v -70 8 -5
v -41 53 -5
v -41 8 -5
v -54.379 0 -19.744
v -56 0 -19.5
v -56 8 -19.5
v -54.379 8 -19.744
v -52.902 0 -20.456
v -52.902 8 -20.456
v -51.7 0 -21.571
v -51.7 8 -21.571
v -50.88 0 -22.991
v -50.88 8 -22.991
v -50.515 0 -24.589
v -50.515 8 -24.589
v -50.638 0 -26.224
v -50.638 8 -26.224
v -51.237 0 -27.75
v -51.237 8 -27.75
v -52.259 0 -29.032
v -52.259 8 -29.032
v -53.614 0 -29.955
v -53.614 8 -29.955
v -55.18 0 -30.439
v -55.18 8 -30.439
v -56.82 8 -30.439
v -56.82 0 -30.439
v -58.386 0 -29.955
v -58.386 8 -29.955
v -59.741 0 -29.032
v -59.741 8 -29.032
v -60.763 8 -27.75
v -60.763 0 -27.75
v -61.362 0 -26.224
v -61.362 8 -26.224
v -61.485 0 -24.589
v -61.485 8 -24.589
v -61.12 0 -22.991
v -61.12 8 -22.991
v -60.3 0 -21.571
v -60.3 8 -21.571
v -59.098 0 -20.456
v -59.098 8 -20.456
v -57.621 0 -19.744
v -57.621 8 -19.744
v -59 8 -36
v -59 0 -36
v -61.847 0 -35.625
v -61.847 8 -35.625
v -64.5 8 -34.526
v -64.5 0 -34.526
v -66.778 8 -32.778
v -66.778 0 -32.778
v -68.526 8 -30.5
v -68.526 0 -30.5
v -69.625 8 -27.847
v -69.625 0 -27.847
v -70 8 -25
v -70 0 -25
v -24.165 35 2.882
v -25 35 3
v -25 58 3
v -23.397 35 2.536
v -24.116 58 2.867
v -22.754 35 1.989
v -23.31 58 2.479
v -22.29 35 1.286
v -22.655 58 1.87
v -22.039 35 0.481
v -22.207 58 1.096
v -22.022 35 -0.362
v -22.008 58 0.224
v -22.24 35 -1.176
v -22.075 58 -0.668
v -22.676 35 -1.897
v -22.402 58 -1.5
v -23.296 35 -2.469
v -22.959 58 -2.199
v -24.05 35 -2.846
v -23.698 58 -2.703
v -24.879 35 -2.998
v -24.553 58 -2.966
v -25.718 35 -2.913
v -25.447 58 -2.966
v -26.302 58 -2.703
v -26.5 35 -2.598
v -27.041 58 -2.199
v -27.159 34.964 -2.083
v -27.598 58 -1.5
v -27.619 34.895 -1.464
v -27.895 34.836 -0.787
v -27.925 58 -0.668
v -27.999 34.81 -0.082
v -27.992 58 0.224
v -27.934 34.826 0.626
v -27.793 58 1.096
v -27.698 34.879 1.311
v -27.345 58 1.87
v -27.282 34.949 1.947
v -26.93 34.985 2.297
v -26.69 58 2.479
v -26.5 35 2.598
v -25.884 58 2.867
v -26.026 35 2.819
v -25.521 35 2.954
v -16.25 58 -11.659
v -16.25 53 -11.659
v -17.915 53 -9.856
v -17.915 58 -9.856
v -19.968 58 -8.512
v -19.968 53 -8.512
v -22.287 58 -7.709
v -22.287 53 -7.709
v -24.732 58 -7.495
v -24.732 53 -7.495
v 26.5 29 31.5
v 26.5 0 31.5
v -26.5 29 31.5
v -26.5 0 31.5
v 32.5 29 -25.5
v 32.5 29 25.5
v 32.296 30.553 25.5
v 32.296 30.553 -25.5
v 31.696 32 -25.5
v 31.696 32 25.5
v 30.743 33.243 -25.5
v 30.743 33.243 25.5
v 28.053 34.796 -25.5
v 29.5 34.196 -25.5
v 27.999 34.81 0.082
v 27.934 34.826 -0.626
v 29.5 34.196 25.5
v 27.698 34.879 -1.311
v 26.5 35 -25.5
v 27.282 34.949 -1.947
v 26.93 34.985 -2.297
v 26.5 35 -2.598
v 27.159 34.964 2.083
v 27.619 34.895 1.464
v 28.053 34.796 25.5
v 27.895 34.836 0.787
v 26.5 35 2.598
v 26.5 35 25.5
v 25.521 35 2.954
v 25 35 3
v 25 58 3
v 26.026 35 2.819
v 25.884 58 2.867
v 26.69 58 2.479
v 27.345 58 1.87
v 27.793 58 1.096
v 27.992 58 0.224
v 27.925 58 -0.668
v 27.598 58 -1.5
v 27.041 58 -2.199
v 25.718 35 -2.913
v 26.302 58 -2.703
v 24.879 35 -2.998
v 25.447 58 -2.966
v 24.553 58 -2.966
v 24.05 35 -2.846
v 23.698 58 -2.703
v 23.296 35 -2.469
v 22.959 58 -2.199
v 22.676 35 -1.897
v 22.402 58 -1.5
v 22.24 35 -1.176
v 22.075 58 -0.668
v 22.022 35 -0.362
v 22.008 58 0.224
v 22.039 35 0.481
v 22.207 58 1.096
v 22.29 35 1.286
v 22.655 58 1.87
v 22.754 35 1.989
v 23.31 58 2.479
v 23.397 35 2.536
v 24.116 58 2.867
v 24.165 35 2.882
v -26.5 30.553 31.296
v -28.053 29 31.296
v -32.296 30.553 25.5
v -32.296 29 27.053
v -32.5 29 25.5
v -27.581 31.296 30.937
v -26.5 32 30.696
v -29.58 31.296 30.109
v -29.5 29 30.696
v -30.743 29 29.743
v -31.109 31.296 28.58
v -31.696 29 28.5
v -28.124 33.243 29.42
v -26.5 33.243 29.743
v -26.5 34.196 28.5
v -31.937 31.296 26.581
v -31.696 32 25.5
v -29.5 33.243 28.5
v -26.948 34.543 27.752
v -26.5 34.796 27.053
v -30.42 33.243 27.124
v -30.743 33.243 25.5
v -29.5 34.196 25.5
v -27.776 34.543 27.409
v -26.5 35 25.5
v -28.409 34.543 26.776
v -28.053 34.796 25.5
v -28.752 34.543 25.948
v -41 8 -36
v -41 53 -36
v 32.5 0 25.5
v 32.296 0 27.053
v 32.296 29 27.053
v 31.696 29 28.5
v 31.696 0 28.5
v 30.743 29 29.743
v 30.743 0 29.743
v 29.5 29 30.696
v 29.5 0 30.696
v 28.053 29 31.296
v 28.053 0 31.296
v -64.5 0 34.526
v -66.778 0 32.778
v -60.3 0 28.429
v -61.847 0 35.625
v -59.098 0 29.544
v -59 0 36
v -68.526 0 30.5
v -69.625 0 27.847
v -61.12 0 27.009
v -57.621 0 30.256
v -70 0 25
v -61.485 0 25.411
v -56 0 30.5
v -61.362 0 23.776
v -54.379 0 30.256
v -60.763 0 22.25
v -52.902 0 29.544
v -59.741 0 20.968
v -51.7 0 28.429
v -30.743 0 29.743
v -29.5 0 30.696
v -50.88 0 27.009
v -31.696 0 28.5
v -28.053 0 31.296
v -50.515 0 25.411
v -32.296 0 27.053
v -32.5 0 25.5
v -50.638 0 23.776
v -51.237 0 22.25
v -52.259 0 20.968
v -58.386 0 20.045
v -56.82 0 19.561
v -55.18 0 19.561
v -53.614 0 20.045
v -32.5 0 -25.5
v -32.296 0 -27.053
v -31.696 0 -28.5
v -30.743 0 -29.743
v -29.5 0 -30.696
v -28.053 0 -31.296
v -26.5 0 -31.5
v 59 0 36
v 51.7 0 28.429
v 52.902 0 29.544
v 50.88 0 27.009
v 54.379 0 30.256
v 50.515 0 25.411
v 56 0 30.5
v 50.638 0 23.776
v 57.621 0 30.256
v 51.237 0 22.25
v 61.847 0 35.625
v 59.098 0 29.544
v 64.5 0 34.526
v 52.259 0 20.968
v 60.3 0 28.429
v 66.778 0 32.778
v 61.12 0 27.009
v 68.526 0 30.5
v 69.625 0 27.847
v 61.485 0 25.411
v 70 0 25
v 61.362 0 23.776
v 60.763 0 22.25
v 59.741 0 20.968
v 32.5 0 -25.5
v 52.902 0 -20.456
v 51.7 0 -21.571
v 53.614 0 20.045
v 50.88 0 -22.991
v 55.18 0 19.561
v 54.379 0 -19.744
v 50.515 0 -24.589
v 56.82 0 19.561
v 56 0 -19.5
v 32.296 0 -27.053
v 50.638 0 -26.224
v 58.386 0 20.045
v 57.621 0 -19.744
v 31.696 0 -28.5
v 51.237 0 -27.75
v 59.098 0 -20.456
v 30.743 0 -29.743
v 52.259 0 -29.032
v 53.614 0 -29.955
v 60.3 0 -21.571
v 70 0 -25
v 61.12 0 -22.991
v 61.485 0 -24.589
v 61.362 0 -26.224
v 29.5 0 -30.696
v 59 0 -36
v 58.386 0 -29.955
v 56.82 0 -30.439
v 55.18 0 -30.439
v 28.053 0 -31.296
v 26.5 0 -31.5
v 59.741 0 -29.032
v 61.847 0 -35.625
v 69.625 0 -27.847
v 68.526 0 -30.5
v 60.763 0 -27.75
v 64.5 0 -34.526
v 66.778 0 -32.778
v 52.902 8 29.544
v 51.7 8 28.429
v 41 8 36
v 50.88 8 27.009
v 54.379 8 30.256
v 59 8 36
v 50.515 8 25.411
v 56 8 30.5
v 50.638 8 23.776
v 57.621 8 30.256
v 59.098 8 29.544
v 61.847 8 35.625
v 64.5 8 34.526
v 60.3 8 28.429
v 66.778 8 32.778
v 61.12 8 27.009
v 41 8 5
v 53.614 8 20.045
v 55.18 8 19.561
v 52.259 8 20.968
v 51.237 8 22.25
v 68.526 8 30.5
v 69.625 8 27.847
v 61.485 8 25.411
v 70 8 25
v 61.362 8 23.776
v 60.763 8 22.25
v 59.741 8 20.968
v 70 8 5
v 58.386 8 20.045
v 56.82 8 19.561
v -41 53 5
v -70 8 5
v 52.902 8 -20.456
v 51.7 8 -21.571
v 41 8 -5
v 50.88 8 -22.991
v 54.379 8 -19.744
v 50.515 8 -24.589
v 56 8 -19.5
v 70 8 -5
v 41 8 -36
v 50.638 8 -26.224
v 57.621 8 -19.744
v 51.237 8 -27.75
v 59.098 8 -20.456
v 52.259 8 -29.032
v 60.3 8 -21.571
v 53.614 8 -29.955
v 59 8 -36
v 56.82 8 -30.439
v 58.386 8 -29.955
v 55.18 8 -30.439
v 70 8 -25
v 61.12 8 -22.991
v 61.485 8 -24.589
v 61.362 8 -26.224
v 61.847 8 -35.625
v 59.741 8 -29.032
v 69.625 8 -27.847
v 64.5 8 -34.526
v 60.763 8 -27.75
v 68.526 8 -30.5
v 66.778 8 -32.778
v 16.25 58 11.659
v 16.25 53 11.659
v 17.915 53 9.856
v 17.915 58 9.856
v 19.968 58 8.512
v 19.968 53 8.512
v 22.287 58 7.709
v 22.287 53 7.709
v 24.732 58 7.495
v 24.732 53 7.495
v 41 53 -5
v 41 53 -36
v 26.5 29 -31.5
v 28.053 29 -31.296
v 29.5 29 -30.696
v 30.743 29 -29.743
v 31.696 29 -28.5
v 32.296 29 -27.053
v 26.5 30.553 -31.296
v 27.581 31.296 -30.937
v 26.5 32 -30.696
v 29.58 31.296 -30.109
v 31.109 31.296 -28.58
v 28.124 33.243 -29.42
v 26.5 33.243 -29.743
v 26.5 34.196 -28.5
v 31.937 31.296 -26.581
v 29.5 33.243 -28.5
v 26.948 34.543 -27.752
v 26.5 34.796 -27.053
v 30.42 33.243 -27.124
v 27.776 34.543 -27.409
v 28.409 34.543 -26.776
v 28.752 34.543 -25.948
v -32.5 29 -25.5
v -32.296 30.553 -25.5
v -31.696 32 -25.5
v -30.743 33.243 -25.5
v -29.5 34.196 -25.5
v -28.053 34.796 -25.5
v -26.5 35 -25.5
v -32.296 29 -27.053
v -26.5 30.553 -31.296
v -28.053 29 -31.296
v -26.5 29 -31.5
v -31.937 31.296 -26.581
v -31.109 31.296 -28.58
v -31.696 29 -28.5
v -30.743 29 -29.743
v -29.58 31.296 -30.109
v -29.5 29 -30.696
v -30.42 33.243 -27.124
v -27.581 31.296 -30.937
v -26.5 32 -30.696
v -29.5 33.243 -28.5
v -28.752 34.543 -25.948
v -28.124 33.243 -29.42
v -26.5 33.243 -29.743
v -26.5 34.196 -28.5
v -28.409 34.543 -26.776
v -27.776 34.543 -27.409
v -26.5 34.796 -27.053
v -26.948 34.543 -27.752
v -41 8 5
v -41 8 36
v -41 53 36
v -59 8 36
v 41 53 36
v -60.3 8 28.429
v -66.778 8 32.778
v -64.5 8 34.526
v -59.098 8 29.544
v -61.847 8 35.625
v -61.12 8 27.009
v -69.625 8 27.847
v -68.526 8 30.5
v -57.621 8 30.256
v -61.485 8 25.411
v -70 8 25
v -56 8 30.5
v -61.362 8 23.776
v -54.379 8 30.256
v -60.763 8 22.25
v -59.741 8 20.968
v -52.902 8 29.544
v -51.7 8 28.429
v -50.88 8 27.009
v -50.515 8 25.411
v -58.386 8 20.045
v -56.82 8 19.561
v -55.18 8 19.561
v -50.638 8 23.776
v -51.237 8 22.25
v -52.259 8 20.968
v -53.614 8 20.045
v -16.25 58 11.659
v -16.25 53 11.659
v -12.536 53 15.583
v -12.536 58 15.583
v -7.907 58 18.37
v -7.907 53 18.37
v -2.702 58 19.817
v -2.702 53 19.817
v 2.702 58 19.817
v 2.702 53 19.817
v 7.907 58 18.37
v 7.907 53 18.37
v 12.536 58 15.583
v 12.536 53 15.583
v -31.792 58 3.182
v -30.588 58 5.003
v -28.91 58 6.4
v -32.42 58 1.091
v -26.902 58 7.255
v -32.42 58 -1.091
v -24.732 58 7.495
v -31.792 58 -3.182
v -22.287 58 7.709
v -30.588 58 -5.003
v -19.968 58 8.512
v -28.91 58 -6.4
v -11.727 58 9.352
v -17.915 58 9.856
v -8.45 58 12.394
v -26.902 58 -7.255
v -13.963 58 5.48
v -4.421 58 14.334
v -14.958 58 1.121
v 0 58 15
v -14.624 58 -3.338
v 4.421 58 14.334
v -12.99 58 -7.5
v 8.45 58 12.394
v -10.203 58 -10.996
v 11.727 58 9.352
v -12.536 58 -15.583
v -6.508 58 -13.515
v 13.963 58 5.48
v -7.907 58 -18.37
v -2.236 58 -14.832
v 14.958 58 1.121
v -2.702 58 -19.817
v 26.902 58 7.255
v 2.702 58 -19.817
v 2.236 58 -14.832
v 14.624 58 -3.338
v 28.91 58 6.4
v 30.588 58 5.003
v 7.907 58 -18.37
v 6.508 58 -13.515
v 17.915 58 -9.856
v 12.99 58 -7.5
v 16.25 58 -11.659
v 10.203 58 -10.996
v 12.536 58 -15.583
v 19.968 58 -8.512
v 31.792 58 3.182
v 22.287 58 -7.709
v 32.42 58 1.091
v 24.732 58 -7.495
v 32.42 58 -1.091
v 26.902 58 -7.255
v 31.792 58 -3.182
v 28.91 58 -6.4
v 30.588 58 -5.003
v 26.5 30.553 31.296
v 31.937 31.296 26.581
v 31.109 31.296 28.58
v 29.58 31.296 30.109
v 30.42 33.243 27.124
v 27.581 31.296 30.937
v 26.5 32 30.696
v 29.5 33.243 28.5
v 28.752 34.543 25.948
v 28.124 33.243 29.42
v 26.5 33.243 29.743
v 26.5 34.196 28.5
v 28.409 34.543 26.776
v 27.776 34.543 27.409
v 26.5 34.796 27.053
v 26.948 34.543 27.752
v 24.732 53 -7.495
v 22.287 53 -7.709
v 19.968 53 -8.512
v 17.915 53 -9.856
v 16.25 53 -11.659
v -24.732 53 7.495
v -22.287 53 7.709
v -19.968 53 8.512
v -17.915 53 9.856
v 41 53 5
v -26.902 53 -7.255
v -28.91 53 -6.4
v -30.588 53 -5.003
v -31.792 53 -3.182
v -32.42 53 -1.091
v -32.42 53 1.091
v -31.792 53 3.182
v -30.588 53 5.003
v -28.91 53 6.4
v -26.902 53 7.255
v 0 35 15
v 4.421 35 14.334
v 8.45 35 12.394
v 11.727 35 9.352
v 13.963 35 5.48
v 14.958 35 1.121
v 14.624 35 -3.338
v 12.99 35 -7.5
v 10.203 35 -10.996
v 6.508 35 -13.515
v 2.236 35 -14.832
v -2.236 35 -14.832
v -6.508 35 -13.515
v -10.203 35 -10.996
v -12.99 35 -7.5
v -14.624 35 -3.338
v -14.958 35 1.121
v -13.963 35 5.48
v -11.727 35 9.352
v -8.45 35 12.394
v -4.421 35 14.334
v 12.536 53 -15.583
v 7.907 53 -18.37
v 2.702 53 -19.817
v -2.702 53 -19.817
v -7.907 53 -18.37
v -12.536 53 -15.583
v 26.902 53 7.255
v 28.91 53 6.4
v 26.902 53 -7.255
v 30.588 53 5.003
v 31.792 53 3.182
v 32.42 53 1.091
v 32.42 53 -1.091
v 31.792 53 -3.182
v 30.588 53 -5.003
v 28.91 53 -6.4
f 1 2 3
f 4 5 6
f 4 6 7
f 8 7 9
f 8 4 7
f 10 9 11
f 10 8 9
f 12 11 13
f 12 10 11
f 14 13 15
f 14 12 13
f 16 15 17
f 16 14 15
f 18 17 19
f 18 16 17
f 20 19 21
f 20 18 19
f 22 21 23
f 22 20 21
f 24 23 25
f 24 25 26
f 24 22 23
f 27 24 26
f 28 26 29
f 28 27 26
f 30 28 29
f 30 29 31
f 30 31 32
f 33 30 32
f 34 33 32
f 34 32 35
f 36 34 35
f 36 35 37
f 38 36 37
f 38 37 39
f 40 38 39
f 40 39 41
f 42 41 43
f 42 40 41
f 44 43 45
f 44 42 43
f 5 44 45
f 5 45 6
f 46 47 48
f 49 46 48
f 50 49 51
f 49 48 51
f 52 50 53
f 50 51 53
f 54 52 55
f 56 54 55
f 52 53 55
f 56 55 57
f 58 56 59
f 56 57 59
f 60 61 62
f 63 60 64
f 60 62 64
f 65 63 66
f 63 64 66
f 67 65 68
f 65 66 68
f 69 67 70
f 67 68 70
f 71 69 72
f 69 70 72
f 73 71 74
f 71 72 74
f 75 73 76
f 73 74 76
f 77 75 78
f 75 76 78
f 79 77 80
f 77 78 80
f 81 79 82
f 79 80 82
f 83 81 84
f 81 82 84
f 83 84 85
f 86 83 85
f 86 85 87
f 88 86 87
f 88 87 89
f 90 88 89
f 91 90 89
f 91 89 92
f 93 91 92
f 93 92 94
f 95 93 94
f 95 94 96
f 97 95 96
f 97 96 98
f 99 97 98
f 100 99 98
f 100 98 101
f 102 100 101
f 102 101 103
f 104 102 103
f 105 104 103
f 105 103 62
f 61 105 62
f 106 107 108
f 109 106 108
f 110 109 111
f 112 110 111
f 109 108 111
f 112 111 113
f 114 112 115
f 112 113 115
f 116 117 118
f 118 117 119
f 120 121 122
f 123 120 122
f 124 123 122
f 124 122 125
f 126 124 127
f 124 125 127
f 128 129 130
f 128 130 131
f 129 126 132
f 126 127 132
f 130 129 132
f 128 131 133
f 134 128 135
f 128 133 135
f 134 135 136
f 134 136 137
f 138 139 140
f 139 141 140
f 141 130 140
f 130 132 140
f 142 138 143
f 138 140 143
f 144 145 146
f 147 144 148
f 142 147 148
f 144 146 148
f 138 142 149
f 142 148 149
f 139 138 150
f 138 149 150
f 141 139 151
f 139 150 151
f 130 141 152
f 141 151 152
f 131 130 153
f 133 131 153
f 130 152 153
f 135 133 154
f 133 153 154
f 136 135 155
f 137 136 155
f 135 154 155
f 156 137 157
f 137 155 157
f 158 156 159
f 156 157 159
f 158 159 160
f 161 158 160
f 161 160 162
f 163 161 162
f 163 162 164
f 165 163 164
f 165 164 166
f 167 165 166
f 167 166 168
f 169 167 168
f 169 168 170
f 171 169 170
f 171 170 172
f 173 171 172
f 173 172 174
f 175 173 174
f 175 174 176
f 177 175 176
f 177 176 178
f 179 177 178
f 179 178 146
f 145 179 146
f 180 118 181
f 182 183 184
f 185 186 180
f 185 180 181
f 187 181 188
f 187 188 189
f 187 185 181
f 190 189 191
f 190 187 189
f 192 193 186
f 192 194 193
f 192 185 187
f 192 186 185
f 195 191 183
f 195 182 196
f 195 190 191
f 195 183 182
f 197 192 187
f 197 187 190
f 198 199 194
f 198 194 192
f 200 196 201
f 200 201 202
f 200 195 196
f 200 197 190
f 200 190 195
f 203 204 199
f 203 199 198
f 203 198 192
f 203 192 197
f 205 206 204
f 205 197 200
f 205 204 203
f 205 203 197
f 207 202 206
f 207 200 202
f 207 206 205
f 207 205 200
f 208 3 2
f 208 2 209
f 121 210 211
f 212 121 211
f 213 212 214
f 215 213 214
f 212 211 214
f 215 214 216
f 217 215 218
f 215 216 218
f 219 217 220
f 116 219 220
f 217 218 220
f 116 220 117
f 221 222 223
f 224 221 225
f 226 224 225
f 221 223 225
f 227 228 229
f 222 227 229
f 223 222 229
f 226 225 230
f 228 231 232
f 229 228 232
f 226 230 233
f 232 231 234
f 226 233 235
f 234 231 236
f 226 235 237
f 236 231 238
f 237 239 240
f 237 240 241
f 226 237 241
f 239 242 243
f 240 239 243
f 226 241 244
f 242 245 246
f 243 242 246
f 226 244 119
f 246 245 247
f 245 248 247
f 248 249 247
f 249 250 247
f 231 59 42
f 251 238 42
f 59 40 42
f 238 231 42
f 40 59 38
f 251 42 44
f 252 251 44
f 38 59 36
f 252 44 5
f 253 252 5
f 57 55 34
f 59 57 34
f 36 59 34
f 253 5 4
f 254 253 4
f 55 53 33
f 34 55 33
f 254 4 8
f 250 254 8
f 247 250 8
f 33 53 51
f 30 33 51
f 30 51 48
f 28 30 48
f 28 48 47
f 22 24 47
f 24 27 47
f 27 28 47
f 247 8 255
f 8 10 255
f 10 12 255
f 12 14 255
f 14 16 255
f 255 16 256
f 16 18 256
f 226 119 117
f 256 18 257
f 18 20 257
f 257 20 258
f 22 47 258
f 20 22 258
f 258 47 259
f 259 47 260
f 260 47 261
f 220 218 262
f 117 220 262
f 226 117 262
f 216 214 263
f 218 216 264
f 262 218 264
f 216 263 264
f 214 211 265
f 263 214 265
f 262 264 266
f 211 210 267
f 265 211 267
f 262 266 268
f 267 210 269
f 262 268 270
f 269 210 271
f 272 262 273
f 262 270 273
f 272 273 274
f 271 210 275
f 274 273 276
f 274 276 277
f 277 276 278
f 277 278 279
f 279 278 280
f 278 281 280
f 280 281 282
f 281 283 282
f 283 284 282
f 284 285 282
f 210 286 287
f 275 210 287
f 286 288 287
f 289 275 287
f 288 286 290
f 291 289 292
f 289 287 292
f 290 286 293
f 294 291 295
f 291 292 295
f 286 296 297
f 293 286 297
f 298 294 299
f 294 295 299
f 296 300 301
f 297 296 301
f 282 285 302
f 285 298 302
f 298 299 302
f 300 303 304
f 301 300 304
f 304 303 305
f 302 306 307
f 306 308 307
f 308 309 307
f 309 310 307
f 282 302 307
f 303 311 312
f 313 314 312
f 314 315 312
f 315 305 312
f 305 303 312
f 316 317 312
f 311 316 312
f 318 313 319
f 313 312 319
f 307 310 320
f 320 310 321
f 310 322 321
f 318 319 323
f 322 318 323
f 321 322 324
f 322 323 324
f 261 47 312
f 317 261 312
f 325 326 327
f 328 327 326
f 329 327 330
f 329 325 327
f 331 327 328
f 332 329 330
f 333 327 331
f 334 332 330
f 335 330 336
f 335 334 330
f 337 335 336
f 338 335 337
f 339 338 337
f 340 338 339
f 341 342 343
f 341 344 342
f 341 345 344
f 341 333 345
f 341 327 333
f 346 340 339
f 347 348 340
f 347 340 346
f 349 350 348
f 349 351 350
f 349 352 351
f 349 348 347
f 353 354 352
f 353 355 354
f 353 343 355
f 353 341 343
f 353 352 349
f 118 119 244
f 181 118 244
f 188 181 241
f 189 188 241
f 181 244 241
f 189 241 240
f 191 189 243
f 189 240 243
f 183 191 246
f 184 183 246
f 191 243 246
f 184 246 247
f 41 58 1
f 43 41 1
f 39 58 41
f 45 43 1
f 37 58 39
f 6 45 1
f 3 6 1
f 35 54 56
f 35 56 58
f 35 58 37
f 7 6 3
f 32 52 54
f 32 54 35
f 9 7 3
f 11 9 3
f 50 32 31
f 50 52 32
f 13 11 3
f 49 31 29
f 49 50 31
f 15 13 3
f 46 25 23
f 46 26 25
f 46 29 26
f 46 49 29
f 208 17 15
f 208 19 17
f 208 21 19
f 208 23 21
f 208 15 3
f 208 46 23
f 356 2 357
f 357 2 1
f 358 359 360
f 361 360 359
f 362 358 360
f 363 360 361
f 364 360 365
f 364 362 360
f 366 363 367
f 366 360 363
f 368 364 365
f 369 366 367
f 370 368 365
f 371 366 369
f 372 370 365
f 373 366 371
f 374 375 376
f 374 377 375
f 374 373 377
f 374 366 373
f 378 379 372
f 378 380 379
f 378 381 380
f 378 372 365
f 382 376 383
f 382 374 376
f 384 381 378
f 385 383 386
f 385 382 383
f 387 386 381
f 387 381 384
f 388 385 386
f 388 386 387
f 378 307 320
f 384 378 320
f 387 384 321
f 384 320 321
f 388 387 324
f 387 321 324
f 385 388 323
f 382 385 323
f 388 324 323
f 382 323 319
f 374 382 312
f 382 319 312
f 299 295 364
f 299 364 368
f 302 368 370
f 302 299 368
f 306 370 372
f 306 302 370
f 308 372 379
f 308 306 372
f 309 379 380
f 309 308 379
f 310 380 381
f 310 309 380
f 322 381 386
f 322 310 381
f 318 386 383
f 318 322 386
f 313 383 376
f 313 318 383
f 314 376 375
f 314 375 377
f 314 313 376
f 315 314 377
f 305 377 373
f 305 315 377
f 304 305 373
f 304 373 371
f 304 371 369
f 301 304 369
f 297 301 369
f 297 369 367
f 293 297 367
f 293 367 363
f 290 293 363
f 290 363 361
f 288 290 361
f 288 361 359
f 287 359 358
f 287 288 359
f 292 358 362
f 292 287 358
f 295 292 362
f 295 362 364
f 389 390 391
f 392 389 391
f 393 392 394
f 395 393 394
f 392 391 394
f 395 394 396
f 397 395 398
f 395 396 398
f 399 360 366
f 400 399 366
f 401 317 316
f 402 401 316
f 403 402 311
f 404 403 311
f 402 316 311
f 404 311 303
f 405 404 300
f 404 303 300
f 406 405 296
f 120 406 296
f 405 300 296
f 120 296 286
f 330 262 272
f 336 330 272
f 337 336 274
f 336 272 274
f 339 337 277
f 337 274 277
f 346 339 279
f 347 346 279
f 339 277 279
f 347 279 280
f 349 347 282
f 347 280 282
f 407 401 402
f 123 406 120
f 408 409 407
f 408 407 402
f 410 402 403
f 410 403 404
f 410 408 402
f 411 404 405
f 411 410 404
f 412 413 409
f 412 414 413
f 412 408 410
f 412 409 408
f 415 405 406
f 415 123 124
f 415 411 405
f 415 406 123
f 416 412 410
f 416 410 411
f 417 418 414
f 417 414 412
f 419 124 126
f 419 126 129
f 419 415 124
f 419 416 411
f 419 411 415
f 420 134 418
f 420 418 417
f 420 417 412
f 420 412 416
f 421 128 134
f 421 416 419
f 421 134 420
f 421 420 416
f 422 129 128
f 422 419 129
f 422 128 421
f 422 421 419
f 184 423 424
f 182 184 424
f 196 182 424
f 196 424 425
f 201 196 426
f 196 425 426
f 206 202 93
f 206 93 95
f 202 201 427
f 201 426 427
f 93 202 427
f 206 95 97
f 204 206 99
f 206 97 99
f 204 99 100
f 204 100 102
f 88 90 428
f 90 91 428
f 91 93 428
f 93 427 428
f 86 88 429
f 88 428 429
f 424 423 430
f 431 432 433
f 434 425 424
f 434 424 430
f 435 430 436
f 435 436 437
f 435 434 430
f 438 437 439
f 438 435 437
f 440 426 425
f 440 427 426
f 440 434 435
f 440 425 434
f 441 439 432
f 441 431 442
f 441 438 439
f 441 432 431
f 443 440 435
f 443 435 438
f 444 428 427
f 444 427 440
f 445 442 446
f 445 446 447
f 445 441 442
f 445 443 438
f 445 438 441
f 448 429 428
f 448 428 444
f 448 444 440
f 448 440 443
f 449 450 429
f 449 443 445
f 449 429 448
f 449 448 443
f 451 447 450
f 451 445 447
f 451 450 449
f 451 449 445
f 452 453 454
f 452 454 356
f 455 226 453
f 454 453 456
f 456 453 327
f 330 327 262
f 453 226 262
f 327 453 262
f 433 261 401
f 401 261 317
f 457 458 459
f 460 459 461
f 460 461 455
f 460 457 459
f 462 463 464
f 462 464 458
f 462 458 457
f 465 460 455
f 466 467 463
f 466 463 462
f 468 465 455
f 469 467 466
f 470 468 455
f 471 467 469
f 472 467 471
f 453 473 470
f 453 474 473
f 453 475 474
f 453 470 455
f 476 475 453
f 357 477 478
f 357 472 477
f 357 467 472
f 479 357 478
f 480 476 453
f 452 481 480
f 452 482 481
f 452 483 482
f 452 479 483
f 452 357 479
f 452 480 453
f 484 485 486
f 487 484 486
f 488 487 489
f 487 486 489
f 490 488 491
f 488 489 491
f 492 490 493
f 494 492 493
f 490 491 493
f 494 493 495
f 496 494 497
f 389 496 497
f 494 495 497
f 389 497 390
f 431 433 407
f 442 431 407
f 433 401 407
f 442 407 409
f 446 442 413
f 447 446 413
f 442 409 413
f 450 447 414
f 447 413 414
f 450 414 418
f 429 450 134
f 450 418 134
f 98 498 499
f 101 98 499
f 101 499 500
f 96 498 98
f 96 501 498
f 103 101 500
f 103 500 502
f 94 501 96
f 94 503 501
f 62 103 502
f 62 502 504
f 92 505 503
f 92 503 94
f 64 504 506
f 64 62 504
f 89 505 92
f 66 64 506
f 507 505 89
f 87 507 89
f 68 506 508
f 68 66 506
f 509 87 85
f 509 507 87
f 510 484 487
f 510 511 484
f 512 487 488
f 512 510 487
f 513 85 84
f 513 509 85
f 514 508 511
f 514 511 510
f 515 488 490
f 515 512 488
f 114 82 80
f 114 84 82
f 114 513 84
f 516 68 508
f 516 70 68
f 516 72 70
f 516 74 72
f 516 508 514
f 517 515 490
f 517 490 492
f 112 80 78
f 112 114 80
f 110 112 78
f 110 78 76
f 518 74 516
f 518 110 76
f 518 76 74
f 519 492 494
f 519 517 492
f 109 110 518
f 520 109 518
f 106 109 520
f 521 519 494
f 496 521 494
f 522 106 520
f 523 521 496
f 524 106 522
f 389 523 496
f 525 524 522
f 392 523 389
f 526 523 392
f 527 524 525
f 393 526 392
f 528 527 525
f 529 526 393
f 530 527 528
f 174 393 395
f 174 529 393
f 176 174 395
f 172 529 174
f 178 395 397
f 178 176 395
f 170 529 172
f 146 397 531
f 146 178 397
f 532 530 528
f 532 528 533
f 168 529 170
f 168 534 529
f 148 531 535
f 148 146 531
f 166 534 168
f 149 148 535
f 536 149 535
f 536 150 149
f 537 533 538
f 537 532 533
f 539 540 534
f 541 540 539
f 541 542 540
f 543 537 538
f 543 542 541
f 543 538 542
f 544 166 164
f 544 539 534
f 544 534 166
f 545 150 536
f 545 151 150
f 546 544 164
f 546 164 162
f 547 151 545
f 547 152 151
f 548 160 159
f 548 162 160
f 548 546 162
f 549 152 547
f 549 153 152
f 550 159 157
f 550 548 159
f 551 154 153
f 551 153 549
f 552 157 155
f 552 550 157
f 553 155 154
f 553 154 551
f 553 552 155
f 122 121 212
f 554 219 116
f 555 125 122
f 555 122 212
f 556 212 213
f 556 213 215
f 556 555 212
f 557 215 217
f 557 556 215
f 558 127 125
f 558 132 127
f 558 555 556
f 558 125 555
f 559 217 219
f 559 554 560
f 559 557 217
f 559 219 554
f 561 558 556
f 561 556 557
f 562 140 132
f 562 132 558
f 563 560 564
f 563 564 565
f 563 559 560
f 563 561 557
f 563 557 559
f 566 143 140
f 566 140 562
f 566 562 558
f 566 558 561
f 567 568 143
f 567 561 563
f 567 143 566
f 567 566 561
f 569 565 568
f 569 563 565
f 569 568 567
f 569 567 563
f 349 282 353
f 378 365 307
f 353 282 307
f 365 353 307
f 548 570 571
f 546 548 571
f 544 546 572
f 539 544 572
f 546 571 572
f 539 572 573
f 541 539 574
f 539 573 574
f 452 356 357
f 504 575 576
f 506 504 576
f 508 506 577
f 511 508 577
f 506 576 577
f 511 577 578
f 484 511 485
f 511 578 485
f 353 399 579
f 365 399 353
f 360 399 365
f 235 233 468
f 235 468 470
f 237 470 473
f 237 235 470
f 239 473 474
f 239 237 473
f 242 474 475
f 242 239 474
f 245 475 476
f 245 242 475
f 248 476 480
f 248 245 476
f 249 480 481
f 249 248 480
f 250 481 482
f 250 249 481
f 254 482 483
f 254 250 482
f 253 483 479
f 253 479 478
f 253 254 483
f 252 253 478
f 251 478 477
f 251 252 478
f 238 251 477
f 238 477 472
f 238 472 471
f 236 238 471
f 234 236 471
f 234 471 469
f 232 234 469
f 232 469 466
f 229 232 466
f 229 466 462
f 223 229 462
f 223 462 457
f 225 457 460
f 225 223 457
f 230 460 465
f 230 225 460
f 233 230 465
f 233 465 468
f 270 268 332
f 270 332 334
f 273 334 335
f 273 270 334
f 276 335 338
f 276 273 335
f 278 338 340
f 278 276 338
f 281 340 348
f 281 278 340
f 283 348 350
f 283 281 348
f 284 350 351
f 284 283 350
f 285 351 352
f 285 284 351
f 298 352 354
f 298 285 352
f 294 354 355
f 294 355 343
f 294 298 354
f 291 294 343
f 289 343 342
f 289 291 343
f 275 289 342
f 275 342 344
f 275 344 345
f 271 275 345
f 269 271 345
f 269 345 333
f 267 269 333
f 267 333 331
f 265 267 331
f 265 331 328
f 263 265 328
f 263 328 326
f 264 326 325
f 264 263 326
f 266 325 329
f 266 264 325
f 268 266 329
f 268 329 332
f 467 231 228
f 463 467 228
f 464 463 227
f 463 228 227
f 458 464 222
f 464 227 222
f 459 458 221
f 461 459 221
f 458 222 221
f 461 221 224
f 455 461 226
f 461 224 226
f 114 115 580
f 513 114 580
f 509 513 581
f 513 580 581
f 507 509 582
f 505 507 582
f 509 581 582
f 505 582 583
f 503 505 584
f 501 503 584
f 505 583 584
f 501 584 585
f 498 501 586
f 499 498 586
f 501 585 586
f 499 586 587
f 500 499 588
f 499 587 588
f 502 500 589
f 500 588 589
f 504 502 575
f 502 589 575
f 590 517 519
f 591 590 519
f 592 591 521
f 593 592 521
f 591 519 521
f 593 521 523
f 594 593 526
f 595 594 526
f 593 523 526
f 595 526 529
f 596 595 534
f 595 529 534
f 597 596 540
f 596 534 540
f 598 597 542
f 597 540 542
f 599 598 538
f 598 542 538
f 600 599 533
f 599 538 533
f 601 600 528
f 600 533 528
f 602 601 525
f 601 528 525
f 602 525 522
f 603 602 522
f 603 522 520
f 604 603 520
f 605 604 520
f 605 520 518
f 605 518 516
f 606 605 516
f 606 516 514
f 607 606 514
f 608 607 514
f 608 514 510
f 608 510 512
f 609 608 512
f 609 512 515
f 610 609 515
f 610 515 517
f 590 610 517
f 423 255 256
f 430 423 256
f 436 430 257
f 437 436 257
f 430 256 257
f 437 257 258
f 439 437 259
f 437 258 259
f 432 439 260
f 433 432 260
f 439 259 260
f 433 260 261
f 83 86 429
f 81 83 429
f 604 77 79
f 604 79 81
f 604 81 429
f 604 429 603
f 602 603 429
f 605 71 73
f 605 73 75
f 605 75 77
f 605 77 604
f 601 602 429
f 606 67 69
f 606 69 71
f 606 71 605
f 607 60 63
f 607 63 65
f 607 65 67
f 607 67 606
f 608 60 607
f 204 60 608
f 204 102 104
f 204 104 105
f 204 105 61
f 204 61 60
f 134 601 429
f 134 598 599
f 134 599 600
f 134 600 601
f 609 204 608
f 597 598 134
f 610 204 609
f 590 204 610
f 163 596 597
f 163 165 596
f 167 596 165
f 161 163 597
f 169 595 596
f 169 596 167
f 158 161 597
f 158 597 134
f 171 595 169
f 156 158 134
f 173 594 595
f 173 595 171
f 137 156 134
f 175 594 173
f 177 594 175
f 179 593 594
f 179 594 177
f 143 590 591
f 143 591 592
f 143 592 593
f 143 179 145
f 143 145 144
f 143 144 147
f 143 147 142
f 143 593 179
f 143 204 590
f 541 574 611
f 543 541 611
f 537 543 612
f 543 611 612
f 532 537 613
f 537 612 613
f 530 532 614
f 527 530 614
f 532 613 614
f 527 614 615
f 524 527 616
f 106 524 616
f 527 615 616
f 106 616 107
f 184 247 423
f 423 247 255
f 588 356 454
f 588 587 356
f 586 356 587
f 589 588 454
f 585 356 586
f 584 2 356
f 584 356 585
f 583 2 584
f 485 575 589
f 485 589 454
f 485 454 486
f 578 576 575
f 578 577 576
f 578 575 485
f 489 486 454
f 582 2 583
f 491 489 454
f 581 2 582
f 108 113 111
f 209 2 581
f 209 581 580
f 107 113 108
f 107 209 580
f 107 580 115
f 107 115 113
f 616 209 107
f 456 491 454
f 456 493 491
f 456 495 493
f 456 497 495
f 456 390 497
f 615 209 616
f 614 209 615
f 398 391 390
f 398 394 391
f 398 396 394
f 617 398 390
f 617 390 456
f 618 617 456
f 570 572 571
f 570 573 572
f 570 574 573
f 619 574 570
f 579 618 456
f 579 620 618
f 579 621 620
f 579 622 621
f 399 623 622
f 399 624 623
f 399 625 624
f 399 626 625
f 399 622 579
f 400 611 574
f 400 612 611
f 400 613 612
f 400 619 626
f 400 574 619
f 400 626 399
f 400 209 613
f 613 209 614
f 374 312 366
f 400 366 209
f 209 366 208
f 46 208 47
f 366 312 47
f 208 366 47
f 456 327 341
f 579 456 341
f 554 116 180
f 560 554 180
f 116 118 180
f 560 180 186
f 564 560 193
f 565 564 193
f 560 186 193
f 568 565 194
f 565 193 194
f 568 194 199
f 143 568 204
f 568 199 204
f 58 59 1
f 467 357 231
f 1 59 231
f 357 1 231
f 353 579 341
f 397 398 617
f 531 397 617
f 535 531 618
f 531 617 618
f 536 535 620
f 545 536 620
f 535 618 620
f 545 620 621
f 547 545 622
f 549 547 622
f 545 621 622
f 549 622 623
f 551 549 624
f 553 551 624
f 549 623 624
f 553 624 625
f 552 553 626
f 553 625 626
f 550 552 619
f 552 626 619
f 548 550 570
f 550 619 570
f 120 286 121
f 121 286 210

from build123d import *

# Parameters (mm, degrees)
SKETCH2_R           = 5.5
BOSS_EXTRUDE1_DEPTH = 8
SKETCH6_W           = 82
SKETCH6_H           = 72
BOSS_EXTRUDE4_DEPTH = 45
BOSS_EXTRUDE5_DEPTH = 5
CUT_EXTRUDE1_DEPTH  = 35
FILLET1_R           = 6
SKETCH9_R           = 15
SKETCH9_R_2         = 3
CUT_EXTRUDE2_DEPTH  = 98.775252493
RIB2_REACH          = 99.775
SKETCH11_WALL_W     = 251.085540362
SKETCH11_WALL_H     = 10


with BuildPart() as part:
    # Sketch2 → Boss-Extrude1 (new body)
    with BuildSketch(Plane(origin=(0, 0, 0), x_dir=(1, 0, 0), z_dir=(0, 1, 0))):
        with BuildLine():
            Line((-59, -36), (59, -36))
            ThreePointArc((59, -36), (66.778174593, -32.778174593), (70, -25))
            Line((70, -25), (70, 25))
            ThreePointArc((70, 25), (66.778174593, 32.778174593), (59, 36))
            Line((59, 36), (-59, 36))
            ThreePointArc((-59, 36), (-66.778174593, 32.778174593), (-70, 25))
            Line((-70, 25), (-70, -25))
            ThreePointArc((-70, -25), (-66.778174593, -32.778174593), (-59, -36))
        make_face()
        with Locations(Location((-56, 25, 0), (0, 0, 270))):
            Circle(SKETCH2_R, mode=Mode.SUBTRACT)
        with Locations(Location((-56, -25, 0), (0, 0, 270))):
            Circle(SKETCH2_R, mode=Mode.SUBTRACT)
        with Locations(Location((56, 25, 0), (0, 0, 270))):
            Circle(SKETCH2_R, mode=Mode.SUBTRACT)
        with Locations(Location((56, -25, 0), (0, 0, 270))):
            Circle(SKETCH2_R, mode=Mode.SUBTRACT)
    extrude(amount=BOSS_EXTRUDE1_DEPTH)

    # Sketch6 → Boss-Extrude4 (add)
    with BuildSketch(Plane(origin=(0, 8, 0), x_dir=(1, 0, 0), z_dir=(0, 1, 0))):
        Rectangle(SKETCH6_W, SKETCH6_H)
    extrude(amount=BOSS_EXTRUDE4_DEPTH)

    # Sketch7 → Boss-Extrude5 (add)
    with BuildSketch(Plane(origin=(0, 53, 0), x_dir=(1, 0, 0), z_dir=(0, 1, 0))):
        with BuildLine():
            ThreePointArc((-16.25, -11.659223816), (0, -20), (16.25, -11.659223816))
            ThreePointArc((16.25, -11.659223816), (19.968227615, -8.512179491), (24.732142857, -7.495215311))
            ThreePointArc((24.732142857, -7.495215311), (32.5, 0), (24.732142857, 7.495215311))
            ThreePointArc((24.732142857, 7.495215311), (19.968227615, 8.512179491), (16.25, 11.659223816))
            ThreePointArc((16.25, 11.659223816), (0, 20), (-16.25, 11.659223816))
            ThreePointArc((-16.25, 11.659223816), (-19.968227615, 8.512179491), (-24.732142857, 7.495215311))
            ThreePointArc((-24.732142857, 7.495215311), (-32.5, 0), (-24.732142857, -7.495215311))
            ThreePointArc((-24.732142857, -7.495215311), (-19.968227615, -8.512179491), (-16.25, -11.659223816))
        make_face()
    extrude(amount=BOSS_EXTRUDE5_DEPTH)

    # Sketch8 → Cut-Extrude1 (cut)
    with BuildSketch(Plane.XZ):
        with BuildLine():
            Line((-26.5, -31.5), (26.5, -31.5))
            ThreePointArc((26.5, -31.5), (30.742640687, -29.742640687), (32.5, -25.5))
            Line((32.5, -25.5), (32.5, 25.5))
            ThreePointArc((32.5, 25.5), (30.742640687, 29.742640687), (26.5, 31.5))
            Line((26.5, 31.5), (-26.5, 31.5))
            ThreePointArc((-26.5, 31.5), (-30.742640687, 29.742640687), (-32.5, 25.5))
            Line((-32.5, 25.5), (-32.5, -25.5))
            ThreePointArc((-32.5, -25.5), (-30.742640687, -29.742640687), (-26.5, -31.5))
        make_face()
    extrude(amount=-CUT_EXTRUDE1_DEPTH, mode=Mode.SUBTRACT)

    # Fillet1
    fillet1_edges = [part.edges().sort_by_distance(p)[0] for p in [
        (-30.742640687, 35, -29.742640687),
        (-32.5, 35, 0),
        (-30.742640687, 35, 29.742640687),
        (0, 35, 31.5),
        (30.742640687, 35, 29.742640687),
        (32.5, 35, 0),
        (30.742640687, 35, -29.742640687),
        (0, 35, -31.5),
    ]]
    fillet(fillet1_edges, radius=FILLET1_R)

    # Sketch9 → Cut-Extrude2 (cut, through all)
    with BuildSketch(Plane(origin=(0, 58, 0), x_dir=(1, 0, 0), z_dir=(0, 1, 0))):
        with Locations(Location((0, 0, 0), (0, 0, 270))):
            Circle(SKETCH9_R)
        with Locations(Location((25, 0, 0), (0, 0, 270))):
            Circle(SKETCH9_R_2)
        with Locations(Location((-25, 0, 0), (0, 0, 270))):
            Circle(SKETCH9_R_2)
    extrude(amount=-CUT_EXTRUDE2_DEPTH, mode=Mode.SUBTRACT)

    # Sketch11 wall → Rib2 (add, up to next)
    with BuildSketch(Plane(origin=(-55.5, 30.5, 0), x_dir=(-0.541701333727, -0.840571035094, 0), z_dir=(0.840571035094, -0.541701333727, 0)), mode=Mode.PRIVATE) as rib2_sk1:
        Rectangle(SKETCH11_WALL_W, SKETCH11_WALL_H)
    rib2_tool1 = extrude(rib2_sk1.sketch, amount=RIB2_REACH, mode=Mode.PRIVATE) - part.part
    rib2 = rib2_tool1.solids().sort_by_distance((-55.5, 30.5, 0))[0]
    add(rib2)

    # Mirror1: Rib2 across plane
    add(rib2.mirror(Plane(origin=(0, 0, 0), x_dir=(0, 0, 1), z_dir=(1, 0, 0))))


solid = part.part
